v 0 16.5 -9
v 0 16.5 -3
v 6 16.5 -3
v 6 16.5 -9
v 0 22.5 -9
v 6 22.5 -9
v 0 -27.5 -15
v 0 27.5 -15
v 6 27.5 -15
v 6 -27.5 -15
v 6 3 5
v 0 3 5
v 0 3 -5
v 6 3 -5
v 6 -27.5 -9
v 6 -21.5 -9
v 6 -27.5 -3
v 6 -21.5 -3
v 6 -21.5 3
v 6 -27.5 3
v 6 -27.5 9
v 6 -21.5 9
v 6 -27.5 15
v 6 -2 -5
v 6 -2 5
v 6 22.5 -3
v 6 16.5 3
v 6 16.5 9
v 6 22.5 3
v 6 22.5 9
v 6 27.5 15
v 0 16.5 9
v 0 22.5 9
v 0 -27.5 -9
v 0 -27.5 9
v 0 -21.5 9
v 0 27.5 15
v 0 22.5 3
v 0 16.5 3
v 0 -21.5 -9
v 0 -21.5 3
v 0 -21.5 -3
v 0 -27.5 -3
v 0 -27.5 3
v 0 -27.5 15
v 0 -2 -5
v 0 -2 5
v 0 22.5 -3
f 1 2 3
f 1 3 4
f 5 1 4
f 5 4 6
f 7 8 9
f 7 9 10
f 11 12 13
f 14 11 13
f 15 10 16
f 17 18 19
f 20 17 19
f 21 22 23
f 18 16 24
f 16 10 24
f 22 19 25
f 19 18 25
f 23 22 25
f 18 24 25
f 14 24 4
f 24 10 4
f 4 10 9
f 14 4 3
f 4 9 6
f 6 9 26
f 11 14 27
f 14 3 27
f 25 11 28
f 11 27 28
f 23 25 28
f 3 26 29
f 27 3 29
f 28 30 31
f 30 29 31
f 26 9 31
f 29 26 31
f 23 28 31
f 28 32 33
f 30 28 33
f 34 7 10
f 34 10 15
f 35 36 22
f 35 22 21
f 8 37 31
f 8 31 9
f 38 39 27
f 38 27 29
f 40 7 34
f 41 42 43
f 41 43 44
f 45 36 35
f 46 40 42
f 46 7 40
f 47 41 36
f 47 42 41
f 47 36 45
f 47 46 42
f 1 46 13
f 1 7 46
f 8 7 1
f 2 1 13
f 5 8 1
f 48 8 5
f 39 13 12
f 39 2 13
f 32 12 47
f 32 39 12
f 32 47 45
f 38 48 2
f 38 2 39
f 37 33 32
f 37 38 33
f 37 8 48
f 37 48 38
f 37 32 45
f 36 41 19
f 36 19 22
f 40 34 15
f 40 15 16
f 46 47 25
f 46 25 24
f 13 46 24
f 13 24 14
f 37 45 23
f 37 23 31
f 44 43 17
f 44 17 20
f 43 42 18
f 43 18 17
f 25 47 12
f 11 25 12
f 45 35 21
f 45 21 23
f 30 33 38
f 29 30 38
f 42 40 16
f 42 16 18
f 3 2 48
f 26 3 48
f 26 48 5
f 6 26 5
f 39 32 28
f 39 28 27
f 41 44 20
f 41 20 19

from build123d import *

# Parameters (mm, degrees)
SKETCH1_W           = 6
SKETCH1_H           = 6
SKETCH1_W_2         = 10
SKETCH1_H_2         = 5
BOSS_EXTRUDE1_DEPTH = 6


with BuildPart() as part:
    # Sketch1 → Boss-Extrude1 (new body)
    with BuildSketch(Plane(origin=(0, 0, 0), x_dir=(0, 0, -1), z_dir=(1, 0, 0))):
        Polygon((-15, 27.5), (15, 27.5), (15, -27.5), (9, -27.5), (9, -21.5), (3, -21.5), (3, -27.5), (-3, -27.5), (-3, -21.5), (-9, -21.5), (-9, -27.5), (-15, -27.5), align=None)
        with Locations((-6, 19.5)):
            Rectangle(SKETCH1_W, SKETCH1_H, mode=Mode.SUBTRACT)
        with Locations((6, 19.5)):
            Rectangle(SKETCH1_W, SKETCH1_H, mode=Mode.SUBTRACT)
        with Locations((0, 0.5)):
            Rectangle(SKETCH1_W_2, SKETCH1_H_2, mode=Mode.SUBTRACT)
    extrude(amount=BOSS_EXTRUDE1_DEPTH)


solid = part.part
